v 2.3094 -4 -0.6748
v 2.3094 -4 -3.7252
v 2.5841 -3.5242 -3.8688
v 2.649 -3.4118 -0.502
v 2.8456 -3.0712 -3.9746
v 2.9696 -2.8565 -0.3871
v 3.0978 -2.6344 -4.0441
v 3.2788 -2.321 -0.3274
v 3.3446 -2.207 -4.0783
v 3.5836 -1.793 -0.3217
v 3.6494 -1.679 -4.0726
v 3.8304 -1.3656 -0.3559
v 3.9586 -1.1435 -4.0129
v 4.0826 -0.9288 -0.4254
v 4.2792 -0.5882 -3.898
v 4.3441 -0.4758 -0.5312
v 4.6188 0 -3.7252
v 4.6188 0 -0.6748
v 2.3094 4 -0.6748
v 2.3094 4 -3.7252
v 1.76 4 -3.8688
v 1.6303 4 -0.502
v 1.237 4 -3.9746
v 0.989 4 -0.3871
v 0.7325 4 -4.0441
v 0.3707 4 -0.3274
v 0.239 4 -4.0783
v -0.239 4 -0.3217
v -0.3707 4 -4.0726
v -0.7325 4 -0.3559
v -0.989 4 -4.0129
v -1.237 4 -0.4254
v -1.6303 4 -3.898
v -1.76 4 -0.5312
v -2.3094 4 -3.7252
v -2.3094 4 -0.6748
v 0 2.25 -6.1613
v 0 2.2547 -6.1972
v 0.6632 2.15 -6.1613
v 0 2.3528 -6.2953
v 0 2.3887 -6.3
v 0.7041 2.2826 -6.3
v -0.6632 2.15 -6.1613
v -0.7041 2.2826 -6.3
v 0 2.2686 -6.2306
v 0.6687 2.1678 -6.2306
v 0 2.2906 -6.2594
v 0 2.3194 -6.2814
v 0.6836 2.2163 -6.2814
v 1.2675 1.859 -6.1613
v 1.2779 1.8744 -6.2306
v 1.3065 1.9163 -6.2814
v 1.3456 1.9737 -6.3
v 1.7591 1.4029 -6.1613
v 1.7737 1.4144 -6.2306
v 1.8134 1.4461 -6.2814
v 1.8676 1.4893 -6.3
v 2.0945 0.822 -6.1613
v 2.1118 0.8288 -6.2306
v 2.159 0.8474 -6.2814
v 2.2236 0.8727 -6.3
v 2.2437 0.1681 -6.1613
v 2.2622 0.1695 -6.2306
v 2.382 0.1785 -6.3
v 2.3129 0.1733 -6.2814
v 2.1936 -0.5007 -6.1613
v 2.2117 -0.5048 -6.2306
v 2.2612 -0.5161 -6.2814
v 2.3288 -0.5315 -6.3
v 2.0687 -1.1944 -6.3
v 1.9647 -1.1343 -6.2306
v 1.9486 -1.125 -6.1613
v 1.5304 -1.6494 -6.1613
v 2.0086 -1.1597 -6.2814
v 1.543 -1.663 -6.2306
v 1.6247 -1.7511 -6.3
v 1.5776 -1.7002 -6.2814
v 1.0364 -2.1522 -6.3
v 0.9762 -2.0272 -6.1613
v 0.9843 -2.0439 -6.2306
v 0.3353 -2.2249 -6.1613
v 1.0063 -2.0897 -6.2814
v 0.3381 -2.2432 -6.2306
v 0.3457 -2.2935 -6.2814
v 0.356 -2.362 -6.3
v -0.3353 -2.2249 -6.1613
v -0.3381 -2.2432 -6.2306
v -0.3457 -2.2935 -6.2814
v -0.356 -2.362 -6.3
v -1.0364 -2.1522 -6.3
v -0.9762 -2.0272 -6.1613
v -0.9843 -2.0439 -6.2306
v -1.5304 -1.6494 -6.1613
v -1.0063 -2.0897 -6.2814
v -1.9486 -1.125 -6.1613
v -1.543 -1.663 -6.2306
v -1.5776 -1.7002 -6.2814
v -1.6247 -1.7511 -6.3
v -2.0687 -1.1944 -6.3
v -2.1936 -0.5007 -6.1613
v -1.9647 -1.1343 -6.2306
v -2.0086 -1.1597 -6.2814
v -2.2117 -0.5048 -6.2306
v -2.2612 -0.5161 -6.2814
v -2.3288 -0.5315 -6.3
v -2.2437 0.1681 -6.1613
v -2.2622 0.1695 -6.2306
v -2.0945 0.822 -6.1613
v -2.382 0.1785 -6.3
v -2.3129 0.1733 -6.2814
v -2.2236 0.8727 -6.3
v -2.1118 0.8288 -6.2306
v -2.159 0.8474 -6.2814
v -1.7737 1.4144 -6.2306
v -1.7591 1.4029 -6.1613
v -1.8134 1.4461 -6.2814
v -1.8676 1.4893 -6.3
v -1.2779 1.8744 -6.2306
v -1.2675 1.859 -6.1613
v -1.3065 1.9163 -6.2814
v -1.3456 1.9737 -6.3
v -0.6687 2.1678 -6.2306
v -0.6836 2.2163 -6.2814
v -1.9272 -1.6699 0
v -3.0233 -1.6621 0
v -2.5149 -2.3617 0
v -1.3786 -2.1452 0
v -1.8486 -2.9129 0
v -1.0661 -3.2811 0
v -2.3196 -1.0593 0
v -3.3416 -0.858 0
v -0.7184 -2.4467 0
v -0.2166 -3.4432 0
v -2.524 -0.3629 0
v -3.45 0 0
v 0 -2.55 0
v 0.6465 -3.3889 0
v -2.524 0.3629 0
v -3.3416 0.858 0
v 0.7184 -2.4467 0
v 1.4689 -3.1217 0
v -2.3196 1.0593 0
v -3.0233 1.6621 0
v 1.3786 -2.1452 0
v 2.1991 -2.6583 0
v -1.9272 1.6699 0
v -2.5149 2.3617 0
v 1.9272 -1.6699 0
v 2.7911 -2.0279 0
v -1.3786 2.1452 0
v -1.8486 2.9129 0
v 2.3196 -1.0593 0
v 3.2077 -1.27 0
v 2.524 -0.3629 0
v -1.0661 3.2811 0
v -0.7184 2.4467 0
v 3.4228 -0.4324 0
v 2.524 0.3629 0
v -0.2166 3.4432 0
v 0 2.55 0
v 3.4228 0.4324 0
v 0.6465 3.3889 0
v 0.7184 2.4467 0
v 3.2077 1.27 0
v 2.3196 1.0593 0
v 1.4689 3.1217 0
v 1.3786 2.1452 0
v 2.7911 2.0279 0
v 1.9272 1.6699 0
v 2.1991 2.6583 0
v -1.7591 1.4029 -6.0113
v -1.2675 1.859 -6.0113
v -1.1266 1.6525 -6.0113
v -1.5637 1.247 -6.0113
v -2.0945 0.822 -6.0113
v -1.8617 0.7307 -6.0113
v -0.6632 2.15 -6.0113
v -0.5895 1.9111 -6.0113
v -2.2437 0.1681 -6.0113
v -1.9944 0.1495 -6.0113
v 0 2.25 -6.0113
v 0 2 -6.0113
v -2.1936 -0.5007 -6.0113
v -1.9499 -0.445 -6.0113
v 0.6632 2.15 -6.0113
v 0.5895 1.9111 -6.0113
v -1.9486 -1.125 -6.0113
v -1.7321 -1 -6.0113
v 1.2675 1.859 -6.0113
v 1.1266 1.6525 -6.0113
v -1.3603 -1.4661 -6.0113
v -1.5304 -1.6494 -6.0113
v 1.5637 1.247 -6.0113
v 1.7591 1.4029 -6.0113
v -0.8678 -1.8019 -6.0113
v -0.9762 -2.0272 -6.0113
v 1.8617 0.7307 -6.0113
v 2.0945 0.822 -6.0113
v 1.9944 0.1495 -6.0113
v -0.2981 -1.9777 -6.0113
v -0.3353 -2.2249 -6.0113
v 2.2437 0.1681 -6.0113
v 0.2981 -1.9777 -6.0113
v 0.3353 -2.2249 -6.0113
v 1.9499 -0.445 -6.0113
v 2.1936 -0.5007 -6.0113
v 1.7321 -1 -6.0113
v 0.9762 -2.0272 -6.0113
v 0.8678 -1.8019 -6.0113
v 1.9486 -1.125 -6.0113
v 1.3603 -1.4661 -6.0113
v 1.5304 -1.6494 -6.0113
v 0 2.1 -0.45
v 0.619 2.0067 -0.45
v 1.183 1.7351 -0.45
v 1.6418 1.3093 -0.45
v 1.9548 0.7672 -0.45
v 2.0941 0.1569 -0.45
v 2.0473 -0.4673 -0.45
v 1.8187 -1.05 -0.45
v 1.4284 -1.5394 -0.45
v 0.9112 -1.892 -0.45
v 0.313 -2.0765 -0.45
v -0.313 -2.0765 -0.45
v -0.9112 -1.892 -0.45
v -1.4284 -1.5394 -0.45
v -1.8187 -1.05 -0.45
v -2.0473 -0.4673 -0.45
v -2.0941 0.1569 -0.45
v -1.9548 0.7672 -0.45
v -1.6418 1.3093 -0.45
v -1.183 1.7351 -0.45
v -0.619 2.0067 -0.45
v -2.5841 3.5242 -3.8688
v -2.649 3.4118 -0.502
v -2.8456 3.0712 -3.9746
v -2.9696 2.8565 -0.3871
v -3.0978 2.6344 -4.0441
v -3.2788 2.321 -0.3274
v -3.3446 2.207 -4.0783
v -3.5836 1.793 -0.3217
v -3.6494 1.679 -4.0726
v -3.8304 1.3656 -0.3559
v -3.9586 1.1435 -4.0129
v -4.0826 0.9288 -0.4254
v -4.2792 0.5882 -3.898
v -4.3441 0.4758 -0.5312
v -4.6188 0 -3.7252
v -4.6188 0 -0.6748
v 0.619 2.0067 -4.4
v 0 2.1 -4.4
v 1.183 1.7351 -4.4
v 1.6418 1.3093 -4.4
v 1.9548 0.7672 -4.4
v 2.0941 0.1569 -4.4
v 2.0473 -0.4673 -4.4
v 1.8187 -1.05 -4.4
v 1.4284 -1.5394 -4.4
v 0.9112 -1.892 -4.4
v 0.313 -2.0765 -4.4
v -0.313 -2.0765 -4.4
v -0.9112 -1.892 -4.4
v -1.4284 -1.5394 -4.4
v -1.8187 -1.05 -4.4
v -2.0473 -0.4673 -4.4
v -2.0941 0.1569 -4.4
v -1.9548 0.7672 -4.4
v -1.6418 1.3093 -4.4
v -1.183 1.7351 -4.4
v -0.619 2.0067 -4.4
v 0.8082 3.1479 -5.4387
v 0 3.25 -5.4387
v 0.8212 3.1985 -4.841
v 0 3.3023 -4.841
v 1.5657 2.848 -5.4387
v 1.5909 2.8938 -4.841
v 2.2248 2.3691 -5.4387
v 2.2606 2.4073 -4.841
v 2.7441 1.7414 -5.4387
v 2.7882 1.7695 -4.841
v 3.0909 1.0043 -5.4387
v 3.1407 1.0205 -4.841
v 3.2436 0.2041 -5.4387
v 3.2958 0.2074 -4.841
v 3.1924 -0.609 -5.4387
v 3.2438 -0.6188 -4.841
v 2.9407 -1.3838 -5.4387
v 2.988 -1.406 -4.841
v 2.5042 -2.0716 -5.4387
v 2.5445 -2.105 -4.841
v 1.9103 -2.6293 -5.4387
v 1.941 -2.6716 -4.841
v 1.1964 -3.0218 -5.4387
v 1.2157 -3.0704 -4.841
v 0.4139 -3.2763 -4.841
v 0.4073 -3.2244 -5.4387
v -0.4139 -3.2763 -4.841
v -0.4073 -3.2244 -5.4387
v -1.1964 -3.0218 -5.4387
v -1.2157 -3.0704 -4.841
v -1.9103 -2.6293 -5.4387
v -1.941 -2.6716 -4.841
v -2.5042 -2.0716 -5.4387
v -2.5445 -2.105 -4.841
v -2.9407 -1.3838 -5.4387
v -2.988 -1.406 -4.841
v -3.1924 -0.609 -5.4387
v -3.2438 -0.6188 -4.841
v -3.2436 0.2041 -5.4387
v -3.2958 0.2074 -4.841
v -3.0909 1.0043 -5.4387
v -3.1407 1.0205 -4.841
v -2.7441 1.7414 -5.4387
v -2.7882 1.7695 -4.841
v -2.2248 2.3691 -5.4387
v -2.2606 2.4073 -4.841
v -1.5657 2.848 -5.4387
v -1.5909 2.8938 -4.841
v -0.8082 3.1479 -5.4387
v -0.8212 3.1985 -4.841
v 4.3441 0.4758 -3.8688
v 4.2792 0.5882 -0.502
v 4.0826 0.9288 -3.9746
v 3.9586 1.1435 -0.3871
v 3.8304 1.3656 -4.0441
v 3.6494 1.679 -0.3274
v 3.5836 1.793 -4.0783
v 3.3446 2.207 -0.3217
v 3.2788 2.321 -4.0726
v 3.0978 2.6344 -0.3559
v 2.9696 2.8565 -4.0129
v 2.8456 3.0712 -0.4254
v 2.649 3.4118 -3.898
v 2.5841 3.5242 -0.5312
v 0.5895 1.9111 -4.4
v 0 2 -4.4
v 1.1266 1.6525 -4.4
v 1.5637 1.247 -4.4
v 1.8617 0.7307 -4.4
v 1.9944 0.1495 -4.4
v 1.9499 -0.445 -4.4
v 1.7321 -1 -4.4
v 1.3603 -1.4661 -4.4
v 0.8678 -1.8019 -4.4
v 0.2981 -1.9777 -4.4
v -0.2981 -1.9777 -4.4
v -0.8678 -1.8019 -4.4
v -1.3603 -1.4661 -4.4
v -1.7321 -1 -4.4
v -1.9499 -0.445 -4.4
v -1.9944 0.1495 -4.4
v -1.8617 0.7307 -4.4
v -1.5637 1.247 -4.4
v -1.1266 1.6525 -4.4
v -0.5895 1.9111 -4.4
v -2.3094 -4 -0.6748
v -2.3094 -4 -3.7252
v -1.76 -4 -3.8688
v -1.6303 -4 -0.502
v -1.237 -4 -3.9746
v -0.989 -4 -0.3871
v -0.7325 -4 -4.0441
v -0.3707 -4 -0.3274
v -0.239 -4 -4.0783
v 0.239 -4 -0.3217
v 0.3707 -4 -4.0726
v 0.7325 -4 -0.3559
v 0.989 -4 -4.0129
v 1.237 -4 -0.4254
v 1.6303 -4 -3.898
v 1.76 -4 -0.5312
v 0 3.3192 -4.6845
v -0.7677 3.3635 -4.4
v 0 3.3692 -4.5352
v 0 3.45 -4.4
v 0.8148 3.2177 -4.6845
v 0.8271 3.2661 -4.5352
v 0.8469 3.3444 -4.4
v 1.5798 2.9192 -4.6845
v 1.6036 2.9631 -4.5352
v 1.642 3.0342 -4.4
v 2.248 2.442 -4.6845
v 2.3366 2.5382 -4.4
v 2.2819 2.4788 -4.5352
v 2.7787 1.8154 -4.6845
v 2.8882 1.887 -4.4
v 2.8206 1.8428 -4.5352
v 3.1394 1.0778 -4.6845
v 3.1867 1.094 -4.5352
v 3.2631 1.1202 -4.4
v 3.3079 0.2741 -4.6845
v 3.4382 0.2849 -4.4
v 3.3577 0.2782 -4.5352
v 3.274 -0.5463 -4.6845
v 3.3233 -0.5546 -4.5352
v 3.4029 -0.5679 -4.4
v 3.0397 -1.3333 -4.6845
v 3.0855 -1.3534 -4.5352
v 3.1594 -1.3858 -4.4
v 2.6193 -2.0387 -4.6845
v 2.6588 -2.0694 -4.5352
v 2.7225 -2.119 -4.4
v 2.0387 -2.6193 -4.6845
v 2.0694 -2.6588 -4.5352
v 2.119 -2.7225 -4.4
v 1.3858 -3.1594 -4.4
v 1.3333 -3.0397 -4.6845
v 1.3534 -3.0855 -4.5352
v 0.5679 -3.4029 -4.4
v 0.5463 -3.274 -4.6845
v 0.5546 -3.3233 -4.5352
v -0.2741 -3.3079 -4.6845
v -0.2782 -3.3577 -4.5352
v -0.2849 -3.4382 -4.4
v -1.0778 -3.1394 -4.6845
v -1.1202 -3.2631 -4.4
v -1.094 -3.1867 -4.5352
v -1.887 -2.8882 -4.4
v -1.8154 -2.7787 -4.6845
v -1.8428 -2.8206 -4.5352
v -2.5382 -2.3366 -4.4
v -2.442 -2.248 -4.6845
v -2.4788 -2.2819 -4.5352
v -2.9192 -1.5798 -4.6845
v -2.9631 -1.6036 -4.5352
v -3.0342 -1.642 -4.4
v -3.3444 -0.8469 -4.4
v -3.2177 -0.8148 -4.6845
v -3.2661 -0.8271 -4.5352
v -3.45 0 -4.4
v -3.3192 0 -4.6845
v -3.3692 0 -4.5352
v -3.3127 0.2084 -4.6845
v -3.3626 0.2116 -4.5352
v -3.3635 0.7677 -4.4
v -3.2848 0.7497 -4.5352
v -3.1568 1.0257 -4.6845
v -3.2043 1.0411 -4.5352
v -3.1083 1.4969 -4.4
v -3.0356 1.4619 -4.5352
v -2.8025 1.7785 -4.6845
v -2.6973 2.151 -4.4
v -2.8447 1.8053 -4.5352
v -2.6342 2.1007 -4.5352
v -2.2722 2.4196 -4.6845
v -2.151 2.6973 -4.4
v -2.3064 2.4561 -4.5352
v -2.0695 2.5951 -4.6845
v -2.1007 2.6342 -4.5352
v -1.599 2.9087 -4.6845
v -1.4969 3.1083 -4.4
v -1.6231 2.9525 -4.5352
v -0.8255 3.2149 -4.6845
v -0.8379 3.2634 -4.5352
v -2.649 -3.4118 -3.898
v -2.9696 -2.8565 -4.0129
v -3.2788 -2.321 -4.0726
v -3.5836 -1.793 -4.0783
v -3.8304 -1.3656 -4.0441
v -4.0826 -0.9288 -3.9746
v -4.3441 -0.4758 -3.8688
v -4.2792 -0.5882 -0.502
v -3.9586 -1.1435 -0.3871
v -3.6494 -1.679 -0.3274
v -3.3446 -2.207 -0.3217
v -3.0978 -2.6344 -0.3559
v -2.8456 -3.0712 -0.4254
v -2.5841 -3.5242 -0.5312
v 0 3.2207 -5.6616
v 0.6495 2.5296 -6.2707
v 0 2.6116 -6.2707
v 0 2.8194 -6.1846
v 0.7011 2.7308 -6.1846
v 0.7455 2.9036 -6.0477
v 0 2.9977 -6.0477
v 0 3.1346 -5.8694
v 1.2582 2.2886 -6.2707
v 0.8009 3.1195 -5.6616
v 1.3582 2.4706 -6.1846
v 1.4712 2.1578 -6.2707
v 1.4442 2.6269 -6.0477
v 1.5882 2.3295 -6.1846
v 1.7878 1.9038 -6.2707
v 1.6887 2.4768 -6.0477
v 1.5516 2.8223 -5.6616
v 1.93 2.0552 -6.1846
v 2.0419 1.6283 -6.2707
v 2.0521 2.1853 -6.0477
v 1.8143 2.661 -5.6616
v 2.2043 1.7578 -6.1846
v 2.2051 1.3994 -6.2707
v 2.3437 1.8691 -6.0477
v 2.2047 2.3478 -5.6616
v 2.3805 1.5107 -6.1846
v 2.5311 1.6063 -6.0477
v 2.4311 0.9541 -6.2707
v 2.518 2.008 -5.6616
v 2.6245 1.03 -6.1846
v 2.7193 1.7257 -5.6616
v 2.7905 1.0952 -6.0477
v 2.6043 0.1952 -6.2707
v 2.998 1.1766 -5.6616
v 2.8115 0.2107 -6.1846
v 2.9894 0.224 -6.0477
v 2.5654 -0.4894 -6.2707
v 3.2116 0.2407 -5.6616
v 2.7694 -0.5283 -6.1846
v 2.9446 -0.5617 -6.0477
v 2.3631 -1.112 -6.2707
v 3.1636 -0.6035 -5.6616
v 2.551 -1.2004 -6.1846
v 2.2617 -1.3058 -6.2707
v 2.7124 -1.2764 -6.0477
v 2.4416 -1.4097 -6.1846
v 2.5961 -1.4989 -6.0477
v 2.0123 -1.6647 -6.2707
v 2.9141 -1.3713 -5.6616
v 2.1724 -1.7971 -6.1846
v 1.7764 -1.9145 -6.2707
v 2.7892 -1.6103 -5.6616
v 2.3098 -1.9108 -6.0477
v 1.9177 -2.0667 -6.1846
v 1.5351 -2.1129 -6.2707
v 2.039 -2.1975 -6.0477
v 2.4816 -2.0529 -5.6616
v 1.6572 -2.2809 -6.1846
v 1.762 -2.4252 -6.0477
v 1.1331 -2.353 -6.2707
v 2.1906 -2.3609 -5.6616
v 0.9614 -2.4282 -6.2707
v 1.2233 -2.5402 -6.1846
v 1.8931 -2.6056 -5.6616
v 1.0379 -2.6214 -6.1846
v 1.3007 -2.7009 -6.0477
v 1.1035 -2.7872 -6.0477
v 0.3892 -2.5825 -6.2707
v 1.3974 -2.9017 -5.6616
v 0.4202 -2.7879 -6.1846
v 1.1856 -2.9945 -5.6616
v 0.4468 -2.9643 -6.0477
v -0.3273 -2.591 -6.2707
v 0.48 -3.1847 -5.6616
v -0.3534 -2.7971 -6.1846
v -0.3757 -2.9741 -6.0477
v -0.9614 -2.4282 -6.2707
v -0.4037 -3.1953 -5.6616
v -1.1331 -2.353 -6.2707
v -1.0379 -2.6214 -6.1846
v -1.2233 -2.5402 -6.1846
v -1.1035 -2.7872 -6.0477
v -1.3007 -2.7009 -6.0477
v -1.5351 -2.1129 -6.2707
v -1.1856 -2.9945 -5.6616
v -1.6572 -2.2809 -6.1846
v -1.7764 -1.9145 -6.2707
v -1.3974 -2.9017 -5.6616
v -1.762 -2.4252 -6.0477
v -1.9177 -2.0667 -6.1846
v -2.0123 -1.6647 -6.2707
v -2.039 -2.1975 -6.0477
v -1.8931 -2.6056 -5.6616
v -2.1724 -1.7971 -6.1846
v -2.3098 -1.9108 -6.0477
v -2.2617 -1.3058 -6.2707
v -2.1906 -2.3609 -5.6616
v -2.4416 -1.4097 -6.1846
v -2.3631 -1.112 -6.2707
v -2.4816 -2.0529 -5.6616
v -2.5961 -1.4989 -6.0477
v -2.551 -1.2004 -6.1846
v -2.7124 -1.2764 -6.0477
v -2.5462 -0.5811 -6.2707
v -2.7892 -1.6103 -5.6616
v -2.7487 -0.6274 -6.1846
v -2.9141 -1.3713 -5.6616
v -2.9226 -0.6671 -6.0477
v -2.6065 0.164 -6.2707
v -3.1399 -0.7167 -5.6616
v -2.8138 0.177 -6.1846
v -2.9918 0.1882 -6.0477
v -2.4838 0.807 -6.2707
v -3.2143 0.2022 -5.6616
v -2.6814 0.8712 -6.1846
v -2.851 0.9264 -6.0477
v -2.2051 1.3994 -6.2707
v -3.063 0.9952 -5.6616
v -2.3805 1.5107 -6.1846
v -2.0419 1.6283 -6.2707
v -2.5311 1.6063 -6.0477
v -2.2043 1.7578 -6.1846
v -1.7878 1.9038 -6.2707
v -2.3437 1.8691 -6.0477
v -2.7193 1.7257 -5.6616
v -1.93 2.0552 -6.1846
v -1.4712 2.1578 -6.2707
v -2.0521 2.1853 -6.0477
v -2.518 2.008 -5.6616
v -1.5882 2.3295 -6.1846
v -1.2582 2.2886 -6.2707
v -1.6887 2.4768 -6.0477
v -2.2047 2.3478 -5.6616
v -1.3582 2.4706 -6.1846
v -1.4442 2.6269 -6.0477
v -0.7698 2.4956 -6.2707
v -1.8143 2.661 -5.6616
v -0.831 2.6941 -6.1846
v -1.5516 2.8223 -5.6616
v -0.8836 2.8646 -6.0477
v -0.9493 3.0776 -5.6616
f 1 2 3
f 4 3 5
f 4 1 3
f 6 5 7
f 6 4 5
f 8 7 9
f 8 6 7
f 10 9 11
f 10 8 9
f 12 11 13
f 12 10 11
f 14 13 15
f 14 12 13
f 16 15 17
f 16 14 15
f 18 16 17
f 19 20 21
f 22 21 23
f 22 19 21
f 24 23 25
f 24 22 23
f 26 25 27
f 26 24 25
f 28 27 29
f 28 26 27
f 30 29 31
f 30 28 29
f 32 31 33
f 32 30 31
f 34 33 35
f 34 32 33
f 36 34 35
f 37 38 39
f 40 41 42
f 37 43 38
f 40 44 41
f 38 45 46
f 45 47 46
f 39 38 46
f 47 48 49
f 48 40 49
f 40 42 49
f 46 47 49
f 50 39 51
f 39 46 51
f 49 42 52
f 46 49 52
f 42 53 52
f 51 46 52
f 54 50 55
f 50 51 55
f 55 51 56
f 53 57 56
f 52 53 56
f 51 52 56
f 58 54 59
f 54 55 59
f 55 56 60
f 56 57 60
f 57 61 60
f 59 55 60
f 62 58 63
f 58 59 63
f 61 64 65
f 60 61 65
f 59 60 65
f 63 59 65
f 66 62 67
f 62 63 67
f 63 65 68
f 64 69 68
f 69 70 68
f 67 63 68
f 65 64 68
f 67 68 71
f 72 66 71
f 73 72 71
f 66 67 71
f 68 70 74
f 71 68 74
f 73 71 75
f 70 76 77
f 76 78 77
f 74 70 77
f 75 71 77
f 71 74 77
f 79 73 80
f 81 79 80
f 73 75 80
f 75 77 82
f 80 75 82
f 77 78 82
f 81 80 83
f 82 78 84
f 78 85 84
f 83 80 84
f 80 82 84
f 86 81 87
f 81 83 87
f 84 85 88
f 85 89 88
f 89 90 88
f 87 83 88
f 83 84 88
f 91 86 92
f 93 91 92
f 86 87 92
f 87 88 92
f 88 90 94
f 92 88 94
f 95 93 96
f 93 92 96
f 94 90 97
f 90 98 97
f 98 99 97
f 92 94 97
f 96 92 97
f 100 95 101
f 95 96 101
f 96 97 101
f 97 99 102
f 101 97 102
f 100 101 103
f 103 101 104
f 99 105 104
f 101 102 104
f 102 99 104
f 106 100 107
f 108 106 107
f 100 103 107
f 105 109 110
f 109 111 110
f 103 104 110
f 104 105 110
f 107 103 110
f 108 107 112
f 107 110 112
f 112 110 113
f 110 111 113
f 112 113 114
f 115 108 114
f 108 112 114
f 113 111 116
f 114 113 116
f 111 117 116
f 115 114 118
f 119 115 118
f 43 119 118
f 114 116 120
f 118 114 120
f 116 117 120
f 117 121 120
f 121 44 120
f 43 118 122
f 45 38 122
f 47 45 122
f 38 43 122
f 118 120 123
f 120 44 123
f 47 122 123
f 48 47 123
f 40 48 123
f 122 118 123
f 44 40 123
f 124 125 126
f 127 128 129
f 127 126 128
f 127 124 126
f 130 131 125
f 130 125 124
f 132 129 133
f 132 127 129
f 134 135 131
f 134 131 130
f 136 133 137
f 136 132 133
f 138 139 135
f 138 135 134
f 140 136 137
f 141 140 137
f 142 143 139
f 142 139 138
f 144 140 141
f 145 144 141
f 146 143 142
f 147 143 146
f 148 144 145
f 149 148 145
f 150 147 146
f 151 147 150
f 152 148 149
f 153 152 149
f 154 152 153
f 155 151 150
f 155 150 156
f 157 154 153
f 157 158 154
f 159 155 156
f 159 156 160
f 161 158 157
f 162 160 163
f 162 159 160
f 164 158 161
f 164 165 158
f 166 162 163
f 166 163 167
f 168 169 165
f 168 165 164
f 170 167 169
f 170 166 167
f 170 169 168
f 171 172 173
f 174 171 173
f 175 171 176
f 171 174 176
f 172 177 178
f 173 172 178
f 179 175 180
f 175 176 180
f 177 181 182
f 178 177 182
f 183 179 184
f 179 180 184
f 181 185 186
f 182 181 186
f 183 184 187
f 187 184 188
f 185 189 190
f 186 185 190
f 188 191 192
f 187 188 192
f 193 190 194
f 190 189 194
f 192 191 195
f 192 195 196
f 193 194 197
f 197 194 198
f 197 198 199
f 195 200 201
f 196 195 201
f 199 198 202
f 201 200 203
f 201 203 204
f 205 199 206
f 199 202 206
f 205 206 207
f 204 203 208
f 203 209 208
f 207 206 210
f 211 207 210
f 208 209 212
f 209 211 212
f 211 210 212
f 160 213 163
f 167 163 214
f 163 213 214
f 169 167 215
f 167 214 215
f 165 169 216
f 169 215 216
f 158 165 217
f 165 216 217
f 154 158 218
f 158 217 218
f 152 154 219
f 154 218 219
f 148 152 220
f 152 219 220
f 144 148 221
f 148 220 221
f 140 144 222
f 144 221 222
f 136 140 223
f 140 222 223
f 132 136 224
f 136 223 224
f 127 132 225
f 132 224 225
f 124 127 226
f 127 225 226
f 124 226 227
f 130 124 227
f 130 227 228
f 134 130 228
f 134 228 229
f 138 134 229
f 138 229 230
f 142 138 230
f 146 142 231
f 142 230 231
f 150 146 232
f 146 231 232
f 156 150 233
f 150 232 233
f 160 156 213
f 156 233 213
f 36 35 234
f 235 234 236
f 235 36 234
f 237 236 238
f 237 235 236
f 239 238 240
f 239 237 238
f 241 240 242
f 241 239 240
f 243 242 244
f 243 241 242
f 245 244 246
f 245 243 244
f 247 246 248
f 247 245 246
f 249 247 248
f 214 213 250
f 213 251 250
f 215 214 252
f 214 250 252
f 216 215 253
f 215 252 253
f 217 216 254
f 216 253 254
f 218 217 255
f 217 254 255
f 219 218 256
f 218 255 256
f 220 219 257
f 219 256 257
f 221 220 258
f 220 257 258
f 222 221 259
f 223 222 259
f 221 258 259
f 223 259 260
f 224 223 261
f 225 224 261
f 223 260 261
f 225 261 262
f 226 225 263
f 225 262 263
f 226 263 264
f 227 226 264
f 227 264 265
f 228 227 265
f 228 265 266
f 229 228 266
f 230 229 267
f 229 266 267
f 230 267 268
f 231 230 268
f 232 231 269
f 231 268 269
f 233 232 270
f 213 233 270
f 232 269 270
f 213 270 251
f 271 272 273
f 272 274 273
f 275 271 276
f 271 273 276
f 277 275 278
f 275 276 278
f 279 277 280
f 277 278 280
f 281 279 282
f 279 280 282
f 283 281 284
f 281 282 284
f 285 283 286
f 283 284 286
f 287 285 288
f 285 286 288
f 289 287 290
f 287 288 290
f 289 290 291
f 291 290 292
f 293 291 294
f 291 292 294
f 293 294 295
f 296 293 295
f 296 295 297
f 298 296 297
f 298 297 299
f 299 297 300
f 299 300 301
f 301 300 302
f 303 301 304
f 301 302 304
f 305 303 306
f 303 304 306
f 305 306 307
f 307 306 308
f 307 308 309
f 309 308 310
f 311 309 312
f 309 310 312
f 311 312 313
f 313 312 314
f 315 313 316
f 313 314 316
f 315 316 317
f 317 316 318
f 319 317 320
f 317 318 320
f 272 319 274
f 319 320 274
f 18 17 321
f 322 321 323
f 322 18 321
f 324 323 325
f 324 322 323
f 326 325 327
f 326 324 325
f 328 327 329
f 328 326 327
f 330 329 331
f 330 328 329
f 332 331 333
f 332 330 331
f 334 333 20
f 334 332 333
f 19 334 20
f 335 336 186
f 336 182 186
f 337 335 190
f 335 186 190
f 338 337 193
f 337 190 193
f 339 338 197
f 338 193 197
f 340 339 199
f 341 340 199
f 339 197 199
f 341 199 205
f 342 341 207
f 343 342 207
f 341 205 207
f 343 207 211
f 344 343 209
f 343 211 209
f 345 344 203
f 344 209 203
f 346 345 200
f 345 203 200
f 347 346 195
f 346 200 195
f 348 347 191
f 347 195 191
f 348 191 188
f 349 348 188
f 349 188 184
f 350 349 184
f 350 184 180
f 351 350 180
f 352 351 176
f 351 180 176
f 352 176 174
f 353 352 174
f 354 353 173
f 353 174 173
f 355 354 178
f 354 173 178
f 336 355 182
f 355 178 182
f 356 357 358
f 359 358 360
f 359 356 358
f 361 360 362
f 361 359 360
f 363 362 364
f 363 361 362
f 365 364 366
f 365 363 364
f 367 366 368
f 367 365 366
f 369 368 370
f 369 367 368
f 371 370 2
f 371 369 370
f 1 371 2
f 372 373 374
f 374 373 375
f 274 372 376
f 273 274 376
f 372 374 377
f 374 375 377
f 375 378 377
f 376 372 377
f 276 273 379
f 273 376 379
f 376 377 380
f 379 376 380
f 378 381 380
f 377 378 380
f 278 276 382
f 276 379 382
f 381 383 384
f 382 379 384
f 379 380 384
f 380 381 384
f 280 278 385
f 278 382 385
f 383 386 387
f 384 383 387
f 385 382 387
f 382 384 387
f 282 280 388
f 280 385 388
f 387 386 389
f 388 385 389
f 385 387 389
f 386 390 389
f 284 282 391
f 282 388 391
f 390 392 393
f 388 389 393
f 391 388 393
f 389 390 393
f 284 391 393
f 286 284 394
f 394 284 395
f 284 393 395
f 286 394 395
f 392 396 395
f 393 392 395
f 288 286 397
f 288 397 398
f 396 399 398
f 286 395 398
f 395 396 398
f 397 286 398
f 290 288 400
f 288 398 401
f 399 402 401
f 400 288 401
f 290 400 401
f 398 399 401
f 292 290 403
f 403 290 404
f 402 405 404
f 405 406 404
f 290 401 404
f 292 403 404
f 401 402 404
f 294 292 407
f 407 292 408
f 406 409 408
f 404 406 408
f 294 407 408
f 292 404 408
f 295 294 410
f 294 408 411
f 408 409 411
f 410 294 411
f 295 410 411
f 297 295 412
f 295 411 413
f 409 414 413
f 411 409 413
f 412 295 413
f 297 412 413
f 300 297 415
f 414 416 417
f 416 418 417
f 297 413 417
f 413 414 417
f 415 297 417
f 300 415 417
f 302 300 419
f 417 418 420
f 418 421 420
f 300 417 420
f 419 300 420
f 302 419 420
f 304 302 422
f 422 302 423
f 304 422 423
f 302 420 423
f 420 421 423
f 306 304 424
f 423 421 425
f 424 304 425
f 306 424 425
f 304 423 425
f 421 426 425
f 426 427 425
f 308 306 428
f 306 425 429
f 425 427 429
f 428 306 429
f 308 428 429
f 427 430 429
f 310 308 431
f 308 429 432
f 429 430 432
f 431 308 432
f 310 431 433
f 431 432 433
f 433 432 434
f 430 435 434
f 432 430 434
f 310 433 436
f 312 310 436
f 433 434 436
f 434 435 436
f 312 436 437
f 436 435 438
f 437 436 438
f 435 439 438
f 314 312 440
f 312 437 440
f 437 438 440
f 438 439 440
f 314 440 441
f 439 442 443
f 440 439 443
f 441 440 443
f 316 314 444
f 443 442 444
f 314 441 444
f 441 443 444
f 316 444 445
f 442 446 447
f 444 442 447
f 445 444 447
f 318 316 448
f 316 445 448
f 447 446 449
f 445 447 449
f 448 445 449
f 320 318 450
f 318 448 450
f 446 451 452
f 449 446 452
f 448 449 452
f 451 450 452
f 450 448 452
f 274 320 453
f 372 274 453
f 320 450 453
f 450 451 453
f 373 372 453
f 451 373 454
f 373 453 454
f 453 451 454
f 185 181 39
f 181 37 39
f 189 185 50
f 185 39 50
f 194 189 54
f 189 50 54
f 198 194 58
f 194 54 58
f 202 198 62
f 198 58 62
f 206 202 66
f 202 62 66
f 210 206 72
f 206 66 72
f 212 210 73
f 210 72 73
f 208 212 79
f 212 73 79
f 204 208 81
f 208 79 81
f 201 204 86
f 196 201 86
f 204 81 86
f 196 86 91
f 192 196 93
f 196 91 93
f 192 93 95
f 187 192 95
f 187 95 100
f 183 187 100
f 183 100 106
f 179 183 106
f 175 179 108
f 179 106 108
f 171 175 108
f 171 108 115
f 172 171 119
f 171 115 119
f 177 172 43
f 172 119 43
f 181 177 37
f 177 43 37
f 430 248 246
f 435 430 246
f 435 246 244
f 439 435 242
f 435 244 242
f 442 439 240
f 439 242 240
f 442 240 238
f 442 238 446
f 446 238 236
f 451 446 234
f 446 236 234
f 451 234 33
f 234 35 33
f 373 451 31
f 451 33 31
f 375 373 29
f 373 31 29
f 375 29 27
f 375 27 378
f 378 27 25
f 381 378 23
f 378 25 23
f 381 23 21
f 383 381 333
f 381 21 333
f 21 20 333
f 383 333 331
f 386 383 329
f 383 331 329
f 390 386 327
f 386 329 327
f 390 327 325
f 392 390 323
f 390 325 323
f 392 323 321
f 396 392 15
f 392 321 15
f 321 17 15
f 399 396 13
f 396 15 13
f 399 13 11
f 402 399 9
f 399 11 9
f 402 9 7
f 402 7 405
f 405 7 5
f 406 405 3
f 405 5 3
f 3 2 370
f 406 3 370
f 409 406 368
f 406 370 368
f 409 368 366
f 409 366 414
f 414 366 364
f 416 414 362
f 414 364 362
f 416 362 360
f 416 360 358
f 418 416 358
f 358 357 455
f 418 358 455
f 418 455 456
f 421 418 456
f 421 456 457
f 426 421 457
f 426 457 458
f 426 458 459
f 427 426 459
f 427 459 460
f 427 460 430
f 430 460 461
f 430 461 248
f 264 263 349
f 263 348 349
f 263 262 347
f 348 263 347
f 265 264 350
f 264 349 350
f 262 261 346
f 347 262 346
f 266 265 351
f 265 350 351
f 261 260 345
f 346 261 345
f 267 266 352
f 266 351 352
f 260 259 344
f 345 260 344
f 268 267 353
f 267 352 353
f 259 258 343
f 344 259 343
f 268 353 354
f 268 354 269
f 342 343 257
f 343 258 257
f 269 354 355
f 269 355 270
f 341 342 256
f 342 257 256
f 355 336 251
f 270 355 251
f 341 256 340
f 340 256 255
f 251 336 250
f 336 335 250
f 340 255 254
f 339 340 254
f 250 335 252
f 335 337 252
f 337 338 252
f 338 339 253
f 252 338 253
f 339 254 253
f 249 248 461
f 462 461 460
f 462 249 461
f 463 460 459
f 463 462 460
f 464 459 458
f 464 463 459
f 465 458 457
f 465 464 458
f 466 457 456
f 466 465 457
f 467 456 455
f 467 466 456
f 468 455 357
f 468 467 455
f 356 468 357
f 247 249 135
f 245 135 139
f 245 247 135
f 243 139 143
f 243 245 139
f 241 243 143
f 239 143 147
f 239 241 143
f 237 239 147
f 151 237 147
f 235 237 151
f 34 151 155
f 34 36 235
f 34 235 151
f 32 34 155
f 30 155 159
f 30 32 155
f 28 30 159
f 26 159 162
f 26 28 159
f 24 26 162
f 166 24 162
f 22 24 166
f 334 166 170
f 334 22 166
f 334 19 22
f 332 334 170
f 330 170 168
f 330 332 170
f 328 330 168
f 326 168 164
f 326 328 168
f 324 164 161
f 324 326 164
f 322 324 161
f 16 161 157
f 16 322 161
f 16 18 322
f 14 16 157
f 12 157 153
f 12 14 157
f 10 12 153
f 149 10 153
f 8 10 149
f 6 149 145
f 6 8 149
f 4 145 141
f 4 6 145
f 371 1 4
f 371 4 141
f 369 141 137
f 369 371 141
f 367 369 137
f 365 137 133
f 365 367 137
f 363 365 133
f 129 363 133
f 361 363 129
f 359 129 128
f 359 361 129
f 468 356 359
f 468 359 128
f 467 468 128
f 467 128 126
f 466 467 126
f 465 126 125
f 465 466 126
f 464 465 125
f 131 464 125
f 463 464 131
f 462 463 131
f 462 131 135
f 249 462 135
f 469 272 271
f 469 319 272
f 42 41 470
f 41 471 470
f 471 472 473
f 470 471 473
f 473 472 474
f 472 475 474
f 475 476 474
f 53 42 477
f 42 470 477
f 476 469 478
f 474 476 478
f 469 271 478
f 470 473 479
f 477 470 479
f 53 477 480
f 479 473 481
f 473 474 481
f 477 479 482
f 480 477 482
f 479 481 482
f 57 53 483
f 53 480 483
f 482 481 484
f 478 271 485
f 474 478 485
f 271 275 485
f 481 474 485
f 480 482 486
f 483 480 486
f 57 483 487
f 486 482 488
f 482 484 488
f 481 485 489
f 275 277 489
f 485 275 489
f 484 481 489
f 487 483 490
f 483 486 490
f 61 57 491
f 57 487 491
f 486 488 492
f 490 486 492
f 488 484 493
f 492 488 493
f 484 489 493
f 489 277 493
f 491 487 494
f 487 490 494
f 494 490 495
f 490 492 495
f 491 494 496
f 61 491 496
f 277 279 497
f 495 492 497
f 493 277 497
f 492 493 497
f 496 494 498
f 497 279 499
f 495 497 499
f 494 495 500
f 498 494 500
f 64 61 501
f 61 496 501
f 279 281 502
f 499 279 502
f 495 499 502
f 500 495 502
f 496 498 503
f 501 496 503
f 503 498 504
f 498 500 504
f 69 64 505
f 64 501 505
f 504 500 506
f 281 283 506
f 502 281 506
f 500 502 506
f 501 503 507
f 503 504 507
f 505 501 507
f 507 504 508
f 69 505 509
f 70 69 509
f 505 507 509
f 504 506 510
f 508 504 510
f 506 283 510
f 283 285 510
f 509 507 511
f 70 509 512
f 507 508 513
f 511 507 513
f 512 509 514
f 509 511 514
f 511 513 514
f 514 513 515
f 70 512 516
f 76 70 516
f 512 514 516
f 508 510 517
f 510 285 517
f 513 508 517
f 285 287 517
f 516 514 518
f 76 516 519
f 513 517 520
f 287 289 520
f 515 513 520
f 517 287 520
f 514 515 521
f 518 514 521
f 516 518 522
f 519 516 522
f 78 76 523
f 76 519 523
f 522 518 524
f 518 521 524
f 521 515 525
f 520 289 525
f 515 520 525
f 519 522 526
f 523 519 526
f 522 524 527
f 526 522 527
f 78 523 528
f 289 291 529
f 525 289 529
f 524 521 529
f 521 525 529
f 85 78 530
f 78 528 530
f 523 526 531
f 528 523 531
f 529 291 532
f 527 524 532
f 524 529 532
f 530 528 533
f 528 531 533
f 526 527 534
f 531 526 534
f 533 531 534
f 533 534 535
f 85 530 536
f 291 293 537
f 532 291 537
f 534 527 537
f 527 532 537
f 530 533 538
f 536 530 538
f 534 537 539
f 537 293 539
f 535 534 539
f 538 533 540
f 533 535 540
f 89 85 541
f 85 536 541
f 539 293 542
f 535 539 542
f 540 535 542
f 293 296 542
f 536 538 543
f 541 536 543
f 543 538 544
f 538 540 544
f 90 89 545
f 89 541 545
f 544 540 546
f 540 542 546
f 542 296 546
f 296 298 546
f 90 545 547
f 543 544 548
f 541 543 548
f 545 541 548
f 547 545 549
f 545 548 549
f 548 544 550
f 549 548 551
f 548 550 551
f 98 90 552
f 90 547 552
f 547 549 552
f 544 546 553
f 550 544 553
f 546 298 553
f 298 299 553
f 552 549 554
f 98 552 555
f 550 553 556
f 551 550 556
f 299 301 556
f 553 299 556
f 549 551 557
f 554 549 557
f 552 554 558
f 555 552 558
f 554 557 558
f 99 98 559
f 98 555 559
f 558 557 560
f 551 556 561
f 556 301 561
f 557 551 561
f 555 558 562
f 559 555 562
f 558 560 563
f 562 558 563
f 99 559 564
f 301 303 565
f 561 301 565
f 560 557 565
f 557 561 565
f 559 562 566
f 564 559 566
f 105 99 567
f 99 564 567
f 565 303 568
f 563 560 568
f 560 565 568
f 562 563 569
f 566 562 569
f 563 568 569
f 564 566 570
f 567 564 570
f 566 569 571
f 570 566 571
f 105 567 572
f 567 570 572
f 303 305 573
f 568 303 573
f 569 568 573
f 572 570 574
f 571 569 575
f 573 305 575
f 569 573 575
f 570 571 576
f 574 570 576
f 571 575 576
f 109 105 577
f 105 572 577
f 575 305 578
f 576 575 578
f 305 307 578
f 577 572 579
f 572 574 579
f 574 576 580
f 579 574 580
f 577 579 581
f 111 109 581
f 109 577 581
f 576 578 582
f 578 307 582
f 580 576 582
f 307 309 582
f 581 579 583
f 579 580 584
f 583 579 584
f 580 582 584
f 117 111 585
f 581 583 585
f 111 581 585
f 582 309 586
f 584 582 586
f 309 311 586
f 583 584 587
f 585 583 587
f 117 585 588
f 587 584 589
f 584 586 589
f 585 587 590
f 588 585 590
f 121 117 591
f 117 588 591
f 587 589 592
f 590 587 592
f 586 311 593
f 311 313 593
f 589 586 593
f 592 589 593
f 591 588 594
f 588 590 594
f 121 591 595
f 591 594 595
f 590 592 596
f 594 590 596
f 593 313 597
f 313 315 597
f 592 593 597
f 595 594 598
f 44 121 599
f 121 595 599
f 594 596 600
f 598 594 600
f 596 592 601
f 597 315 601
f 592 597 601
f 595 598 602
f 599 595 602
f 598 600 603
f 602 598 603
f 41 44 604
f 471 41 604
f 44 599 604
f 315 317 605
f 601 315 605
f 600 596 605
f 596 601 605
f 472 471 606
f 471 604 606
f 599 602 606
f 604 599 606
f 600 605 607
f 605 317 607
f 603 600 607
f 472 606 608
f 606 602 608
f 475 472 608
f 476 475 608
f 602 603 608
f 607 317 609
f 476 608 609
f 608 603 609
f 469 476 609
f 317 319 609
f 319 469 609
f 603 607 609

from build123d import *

# Parameters (mm, degrees)
BOSS_EXTRUDE1_DEPTH = 4.4


with BuildPart() as part:
    # Sketch1 → Boss-Extrude1 (new body)
    with BuildSketch(Plane.XY):
        Polygon((4.618802154, 0), (2.309401077, 4), (-2.309401077, 4), (-4.618802154, 0), (-2.309401077, -4), (2.309401077, -4), align=None)
    extrude(amount=-BOSS_EXTRUDE1_DEPTH)

    # Sketch2 → Revolve1 (revolve)
    with BuildSketch(Plane(origin=(0, 0, 0), x_dir=(0, 0, -1), z_dir=(1, 0, 0))):
        with BuildLine():
            Line((4.4, 2), (6.011274944, 2))
            Line((6.011274944, 2), (6.011274944, 2.25))
            Line((6.011274944, 2.25), (6.161274944, 2.25))
            ThreePointArc((6.161274944, 2.25), (6.259368372, 2.290631628), (6.3, 2.388725056))
            ThreePointArc((6.3, 2.388725056), (6.04773841, 2.99773841), (5.438725056, 3.25))
            Line((5.438725056, 3.25), (4.841008238, 3.302293446))
            ThreePointArc((4.841008238, 3.302293446), (4.608464966, 3.340201362), (4.4, 3.45))
            Line((4.4, 3.45), (4.4, 2))
        make_face()
    revolve(axis=Axis((0, 0, 11.954173971), (0, 0, -1)))

    # Sketch3 → Cut-Revolve1 (revolve, cut)
    with BuildSketch(Plane(origin=(0, 0, 0), x_dir=(1, 0, 0), z_dir=(0, 1, 0))):
        Polygon((-3.45, 4.4), (-4.618802154, 3.725191762), (-4.618802154, 4.4), align=None)
        Polygon((-3.45, 0), (-4.618802154, 0.674808238), (-4.618802154, 0), align=None)
    revolve(axis=Axis((0, 0, 0), (0, 0, -1)), mode=Mode.SUBTRACT)

    # Sketch4 → Cut-Revolve2 (revolve, cut)
    with BuildSketch(Plane(origin=(0, 0, 0), x_dir=(0, 0, -1), z_dir=(1, 0, 0))):
        Polygon((0, 2.55), (0.45, 2.1), (4.4, 2.1), (4.4, 0), (0, 0), align=None)
    revolve(axis=Axis((0, 0, 1.412389309), (0, 0, -1)), mode=Mode.SUBTRACT)


solid = part.part
